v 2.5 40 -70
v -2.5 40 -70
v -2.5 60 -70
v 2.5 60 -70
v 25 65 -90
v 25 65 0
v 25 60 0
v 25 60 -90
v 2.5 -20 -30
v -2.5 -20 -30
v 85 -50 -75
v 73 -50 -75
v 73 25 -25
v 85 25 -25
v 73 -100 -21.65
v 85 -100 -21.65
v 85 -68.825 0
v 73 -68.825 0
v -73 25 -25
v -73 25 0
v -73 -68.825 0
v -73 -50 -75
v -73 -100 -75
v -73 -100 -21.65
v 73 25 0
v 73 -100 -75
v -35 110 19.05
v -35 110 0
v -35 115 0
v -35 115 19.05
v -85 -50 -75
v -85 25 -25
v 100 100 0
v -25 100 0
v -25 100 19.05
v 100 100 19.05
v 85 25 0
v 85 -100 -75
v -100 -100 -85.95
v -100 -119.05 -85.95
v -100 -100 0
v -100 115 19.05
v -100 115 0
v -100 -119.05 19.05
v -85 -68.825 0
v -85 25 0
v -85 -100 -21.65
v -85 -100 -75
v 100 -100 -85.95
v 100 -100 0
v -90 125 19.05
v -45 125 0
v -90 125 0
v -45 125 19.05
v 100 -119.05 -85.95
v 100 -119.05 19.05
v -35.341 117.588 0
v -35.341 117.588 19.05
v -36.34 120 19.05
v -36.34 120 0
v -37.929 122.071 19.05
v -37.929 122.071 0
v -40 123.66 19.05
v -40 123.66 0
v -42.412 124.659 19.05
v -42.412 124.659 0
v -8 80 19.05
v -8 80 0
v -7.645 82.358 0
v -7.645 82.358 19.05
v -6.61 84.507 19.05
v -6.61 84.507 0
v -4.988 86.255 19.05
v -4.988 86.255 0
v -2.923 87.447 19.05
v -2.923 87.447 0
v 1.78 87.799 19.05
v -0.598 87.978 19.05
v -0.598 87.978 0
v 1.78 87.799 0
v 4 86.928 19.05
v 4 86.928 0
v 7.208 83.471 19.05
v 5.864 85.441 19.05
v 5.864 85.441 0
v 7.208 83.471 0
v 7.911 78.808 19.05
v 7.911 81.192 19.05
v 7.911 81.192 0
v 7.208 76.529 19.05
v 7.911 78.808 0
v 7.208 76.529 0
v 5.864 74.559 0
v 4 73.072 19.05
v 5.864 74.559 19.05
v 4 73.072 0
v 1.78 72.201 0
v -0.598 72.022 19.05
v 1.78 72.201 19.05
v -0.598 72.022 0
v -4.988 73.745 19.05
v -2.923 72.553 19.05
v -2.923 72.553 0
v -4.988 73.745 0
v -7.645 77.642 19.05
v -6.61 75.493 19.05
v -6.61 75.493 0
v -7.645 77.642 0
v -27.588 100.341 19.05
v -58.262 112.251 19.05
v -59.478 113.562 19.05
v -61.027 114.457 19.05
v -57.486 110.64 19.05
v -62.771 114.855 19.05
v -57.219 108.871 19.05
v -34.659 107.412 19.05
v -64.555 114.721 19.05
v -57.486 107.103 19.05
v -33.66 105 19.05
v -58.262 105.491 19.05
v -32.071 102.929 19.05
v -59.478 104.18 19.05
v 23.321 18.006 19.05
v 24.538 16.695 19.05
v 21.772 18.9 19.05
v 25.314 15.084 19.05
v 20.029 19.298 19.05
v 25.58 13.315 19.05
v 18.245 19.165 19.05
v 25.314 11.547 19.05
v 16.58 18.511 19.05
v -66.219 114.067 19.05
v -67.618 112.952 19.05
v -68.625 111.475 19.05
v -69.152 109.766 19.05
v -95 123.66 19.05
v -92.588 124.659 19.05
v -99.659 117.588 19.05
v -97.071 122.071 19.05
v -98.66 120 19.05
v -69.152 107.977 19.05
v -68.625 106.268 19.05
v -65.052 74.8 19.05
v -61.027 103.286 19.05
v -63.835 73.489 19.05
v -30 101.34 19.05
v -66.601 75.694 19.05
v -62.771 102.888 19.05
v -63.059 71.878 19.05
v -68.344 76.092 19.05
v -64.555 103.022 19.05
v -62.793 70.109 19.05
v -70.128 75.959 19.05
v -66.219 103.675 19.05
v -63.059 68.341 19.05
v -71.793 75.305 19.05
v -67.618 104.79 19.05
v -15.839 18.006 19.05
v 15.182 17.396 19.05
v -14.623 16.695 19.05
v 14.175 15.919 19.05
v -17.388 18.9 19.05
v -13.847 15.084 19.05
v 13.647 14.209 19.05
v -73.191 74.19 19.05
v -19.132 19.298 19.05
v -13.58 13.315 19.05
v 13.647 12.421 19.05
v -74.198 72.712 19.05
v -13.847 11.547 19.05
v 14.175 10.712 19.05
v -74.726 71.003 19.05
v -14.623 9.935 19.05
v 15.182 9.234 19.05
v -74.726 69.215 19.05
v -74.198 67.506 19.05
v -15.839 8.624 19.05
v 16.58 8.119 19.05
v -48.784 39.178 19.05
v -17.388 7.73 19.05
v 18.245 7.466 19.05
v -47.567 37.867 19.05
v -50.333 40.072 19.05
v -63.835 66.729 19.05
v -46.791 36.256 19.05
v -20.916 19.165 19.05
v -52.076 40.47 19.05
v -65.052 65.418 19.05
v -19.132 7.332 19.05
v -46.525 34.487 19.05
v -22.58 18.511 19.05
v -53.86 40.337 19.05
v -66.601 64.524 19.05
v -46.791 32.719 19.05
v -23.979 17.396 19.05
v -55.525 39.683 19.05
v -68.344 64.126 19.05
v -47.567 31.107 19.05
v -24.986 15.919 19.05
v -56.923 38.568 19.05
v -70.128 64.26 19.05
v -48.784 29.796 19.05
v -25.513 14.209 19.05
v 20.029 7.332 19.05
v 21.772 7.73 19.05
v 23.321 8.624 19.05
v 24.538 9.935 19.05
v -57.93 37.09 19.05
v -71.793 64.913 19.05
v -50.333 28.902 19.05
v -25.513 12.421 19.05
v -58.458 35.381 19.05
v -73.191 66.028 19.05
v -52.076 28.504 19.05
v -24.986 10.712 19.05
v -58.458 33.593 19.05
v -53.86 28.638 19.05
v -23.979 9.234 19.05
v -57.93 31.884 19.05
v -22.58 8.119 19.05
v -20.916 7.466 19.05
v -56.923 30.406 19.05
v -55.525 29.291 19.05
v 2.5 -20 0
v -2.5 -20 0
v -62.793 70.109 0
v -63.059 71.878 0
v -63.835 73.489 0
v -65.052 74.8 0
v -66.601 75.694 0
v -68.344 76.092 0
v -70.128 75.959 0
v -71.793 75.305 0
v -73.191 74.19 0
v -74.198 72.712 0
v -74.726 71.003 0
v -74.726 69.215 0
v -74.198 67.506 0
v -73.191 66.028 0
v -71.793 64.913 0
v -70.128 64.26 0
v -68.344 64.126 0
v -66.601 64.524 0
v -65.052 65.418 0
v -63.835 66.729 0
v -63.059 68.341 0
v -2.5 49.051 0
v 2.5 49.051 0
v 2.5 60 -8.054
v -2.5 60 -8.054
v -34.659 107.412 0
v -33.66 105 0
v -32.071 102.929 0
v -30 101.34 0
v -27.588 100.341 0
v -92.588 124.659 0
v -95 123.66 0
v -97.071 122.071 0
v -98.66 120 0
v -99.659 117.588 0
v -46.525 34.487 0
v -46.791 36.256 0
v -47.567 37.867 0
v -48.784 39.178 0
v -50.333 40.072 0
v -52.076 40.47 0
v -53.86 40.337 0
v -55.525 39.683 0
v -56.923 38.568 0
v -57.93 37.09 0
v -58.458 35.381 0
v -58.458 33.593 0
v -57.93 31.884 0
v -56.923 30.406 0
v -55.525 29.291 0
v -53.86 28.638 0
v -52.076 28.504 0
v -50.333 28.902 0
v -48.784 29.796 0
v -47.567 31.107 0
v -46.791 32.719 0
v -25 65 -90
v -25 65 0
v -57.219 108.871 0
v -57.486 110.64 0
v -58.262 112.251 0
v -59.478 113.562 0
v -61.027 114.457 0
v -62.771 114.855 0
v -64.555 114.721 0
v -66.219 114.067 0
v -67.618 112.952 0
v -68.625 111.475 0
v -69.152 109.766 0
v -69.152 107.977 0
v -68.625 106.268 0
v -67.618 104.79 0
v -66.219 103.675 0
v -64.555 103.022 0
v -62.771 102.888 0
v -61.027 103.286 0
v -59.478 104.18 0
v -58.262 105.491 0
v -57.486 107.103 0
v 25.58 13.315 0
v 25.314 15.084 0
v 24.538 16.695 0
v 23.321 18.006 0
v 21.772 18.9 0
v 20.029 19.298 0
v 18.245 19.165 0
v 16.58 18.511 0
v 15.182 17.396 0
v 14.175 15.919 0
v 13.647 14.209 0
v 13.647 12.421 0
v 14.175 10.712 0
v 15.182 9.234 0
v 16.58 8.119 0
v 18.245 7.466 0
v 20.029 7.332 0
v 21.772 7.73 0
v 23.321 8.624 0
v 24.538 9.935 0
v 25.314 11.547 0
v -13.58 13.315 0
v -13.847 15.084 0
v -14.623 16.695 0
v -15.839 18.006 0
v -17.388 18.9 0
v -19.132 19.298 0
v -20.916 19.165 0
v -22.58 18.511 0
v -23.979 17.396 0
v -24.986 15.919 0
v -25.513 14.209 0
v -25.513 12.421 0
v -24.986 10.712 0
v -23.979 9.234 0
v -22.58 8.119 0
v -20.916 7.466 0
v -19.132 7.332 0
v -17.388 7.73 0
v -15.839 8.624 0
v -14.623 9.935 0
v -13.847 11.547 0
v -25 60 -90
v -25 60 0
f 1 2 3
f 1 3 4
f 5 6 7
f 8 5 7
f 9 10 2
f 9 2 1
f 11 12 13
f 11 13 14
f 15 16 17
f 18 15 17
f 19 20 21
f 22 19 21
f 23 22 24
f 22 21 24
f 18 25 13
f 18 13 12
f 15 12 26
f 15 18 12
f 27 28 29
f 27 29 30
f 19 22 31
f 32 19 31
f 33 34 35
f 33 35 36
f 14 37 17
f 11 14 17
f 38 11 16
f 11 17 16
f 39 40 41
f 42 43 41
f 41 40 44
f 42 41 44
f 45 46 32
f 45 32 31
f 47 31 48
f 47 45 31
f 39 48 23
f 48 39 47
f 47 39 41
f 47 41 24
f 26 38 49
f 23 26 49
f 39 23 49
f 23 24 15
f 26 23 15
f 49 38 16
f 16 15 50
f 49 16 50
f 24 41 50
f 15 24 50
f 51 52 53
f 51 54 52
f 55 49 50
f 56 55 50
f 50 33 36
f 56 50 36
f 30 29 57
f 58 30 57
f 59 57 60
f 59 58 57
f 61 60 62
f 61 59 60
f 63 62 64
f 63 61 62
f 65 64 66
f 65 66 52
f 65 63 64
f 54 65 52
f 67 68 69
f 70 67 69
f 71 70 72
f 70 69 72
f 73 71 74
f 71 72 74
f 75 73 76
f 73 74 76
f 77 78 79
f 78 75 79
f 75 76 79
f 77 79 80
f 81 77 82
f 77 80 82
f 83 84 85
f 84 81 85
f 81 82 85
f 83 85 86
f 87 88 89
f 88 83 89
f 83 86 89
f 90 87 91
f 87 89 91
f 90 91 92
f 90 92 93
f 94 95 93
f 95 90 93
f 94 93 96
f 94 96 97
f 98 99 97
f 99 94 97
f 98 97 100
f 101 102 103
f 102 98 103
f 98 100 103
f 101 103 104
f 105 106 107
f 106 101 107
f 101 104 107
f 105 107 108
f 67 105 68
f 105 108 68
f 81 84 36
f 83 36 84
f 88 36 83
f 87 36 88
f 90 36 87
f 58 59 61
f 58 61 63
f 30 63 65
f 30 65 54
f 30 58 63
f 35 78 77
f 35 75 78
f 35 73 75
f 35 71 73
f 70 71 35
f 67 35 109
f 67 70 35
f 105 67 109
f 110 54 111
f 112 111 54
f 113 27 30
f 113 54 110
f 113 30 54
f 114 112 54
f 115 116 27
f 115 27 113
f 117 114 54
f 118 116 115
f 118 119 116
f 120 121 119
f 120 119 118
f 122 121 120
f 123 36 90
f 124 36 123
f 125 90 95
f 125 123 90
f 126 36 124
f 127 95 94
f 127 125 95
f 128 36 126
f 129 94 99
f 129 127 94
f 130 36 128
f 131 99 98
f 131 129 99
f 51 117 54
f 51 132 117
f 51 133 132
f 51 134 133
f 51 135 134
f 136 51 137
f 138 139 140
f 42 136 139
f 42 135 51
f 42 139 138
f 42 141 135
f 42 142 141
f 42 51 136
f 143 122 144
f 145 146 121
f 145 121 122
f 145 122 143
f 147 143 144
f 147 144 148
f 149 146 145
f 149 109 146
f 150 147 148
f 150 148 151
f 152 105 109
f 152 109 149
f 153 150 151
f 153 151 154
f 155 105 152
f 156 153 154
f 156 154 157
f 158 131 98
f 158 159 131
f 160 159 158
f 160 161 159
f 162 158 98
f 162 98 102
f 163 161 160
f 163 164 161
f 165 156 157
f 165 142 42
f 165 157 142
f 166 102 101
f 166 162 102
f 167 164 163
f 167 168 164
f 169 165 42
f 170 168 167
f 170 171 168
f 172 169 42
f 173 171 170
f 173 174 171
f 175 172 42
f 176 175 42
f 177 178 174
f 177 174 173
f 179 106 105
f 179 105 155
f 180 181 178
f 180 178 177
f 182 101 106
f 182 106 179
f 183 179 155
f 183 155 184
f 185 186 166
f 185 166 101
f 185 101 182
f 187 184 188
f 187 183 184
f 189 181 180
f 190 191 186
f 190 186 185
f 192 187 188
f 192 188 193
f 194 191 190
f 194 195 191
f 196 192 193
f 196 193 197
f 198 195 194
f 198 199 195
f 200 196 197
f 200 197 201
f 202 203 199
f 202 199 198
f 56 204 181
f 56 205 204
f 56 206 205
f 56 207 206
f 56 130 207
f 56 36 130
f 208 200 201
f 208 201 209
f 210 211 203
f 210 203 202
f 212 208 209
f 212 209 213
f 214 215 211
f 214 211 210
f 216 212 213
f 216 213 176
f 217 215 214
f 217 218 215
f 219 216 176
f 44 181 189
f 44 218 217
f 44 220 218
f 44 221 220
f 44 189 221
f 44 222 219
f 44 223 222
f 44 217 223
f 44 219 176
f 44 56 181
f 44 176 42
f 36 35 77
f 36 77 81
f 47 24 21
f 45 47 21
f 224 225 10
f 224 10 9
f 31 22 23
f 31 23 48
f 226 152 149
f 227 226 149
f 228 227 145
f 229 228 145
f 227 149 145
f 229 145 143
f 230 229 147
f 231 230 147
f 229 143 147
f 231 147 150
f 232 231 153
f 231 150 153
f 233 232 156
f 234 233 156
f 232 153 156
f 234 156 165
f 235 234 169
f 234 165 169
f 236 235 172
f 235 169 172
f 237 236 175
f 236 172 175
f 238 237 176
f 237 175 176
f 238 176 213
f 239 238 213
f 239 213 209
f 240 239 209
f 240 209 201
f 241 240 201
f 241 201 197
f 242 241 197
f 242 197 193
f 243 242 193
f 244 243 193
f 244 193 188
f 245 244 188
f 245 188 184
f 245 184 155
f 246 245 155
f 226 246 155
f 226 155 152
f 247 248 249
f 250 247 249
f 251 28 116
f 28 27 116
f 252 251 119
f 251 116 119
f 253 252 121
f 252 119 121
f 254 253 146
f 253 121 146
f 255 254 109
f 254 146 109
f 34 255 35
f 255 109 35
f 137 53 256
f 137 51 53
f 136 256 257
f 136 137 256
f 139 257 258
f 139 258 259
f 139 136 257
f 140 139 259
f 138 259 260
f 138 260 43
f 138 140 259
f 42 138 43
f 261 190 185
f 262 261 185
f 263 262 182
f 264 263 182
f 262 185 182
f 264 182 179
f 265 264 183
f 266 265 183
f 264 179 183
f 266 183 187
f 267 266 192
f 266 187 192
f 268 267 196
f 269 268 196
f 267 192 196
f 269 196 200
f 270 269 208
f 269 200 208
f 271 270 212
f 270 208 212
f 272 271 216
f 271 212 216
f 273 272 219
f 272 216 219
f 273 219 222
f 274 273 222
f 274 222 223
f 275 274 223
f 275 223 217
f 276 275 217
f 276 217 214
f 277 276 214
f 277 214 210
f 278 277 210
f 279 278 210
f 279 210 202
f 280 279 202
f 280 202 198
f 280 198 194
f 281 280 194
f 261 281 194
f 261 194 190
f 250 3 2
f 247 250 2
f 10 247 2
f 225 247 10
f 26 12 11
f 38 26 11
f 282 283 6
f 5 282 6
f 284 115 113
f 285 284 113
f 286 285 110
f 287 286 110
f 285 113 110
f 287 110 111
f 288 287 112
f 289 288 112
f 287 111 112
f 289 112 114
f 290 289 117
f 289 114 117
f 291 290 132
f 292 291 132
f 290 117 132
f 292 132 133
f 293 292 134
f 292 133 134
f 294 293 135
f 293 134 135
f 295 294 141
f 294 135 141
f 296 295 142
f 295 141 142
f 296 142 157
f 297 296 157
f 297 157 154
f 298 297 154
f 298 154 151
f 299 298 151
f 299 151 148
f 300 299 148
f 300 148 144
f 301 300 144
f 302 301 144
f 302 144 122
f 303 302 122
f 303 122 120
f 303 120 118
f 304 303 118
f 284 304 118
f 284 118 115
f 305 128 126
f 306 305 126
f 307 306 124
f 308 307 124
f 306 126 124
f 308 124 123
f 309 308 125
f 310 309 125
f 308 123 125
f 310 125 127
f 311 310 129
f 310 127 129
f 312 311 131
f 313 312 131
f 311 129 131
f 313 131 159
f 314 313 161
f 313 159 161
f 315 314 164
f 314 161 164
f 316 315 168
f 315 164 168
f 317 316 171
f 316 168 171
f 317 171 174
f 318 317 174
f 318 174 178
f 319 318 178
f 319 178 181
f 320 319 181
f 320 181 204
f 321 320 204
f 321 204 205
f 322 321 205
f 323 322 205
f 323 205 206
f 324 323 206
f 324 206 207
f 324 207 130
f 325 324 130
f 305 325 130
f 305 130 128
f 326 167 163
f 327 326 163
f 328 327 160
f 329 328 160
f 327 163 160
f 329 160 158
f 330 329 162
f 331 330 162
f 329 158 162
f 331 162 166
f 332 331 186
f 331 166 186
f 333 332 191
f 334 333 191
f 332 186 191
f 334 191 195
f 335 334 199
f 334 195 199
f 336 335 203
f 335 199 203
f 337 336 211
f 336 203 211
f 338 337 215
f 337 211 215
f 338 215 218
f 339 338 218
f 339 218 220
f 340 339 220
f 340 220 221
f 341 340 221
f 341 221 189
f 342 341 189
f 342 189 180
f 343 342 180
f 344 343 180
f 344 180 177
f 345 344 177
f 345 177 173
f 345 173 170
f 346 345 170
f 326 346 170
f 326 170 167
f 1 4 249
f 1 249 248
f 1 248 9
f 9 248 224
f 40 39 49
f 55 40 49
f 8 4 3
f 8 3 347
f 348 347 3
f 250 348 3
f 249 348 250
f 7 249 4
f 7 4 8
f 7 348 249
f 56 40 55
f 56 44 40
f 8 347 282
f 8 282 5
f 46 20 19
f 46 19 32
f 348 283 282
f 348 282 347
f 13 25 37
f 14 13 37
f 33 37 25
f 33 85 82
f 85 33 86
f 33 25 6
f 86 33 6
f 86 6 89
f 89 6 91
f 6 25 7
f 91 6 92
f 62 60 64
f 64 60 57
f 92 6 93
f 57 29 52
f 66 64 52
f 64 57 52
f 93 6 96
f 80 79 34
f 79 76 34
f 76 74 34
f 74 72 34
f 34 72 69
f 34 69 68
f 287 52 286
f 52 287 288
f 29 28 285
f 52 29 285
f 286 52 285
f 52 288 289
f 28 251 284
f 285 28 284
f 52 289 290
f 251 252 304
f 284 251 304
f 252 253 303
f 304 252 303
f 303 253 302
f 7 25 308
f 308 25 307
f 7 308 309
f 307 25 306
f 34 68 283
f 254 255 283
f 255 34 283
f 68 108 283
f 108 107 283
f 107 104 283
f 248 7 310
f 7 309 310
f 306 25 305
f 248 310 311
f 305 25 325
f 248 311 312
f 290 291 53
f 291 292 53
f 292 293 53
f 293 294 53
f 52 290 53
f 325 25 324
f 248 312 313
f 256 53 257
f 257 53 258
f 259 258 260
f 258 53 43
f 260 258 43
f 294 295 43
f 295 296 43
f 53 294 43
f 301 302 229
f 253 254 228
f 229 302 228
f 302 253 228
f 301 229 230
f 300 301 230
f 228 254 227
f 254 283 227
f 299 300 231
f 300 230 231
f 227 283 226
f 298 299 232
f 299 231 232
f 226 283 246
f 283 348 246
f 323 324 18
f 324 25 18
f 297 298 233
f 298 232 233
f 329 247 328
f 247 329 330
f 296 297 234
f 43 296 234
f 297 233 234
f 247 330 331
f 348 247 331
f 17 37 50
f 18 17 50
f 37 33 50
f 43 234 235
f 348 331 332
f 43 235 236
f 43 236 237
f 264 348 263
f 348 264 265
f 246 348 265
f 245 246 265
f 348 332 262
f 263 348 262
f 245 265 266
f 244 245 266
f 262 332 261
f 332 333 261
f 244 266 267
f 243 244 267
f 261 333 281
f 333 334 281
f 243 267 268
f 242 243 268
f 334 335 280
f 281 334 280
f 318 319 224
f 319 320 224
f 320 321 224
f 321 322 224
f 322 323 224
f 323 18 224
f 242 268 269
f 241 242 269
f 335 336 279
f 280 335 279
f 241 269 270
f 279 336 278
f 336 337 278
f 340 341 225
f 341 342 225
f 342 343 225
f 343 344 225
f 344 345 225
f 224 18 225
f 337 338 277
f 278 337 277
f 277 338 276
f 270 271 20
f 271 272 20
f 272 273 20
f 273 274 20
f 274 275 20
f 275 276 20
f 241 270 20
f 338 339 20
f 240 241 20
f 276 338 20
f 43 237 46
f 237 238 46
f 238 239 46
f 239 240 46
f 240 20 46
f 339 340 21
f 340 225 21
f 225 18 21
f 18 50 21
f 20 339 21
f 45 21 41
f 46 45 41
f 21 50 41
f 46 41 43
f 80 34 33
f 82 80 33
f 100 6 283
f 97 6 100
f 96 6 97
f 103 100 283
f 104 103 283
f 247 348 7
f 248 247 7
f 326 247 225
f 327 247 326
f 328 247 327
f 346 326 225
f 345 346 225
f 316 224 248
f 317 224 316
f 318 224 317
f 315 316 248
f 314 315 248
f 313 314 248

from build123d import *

# Parameters (mm, degrees)
F0_W      = 200
F0_H      = 200
F1_DEPTH  = 19.05
F3_D      = 16
F4_W      = 12
F4_H      = 125
F5_DEPTH  = 75
F6_SIZE2  = 75
F6_SIZE   = 50
F9_DEPTH  = 19.05
F11_DEPTH = 500
F12_W     = 50
F12_H     = 5
F13_DEPTH = 90
F14_W     = 5
F14_H     = 80
F15_DEPTH = 70
F16_SIZE2 = 40
F16_SIZE  = 60
F18_DEPTH = 25
F19_W     = 65
F19_H     = 19.05
F20_DEPTH = 25
F21_R     = 10
F22_R     = 6
F23_DEPTH = 25


with BuildPart() as f1:
    # F0 (on Top) → F1 (new body)
    with BuildSketch(Plane.XY):
        Rectangle(F0_W, F0_H)
    extrude(amount=F1_DEPTH)

    # F3 (through all)
    with Locations(Plane.XY.offset(19.05)):
        with Locations((0, 80)):
            Hole(F3_D / 2)

    # F4 (on face) → F5 (join)
    with BuildSketch(Plane(origin=(0, 0, 0), x_dir=(1, 0, 0), z_dir=(0, 0, -1))):
        with Locations((79, 37.5)):
            Rectangle(F4_W, F4_H)
    extrude(amount=F5_DEPTH)

    # F6
    f6_edges = [f1.edges().sort_by_distance(p)[0] for p in [
        (79, 25, -75),
    ]]
    f6_side = f1.faces().sort_by_distance((79, 25, -37.5))[0]
    chamfer(f6_edges, length=F6_SIZE, length2=F6_SIZE2, reference=f6_side)

    # F7: F1 across plane


with BuildPart() as f1_1:
    add(f1.part)
    add(f1.part.mirror(Plane.YZ))

    # F8 (on face) → F9 (join)
    with BuildSketch(Plane.XZ.offset(100)):
        Polygon((100, -85.95), (100, 0), (85, 0), (85, -75), (73, -75), (73, 0), (-73, 0), (-73, -75), (-85, -75), (-85, 0), (-100, 0), (-100, -85.95), align=None)
        Polygon((100, 0), (100, 19.05), (-100, 19.05), (-100, 0), (-85, 0), (-85, -75), (-73, -75), (-73, 0), (73, 0), (73, -75), (85, -75), (85, 0), align=None)
    extrude(amount=F9_DEPTH)

    # F10 (on face) → F11 (cut)
    with BuildSketch(Plane.YZ.offset(85)):
        Polygon((-100, 0), (-100, -21.6502193362), (-68.8245669007, 0), align=None)
    extrude(amount=-F11_DEPTH, mode=Mode.SUBTRACT)

    # F12 (on face) → F13 (join)
    with BuildSketch(Plane(origin=(0, 0, 0), x_dir=(1, 0, 0), z_dir=(0, 0, -1))):
        with Locations((0, -62.5)):
            Rectangle(F12_W, F12_H)
    extrude(amount=F13_DEPTH)

    # F14 (on face) → F15 (join)
    with BuildSketch(Plane(origin=(0, 0, 0), x_dir=(1, 0, 0), z_dir=(0, 0, -1))):
        with Locations((0, -20)):
            Rectangle(F14_W, F14_H)
    extrude(amount=F15_DEPTH)

    # F16
    f16_edges = [f1_1.edges().sort_by_distance(p)[0] for p in [
        (0, -20, -70),
    ]]
    f16_side = f1_1.faces().sort_by_distance((0, 20, -70))[0]
    chamfer(f16_edges, length=F16_SIZE, length2=F16_SIZE2, reference=f16_side)

    # F17 (on face) → F18 (cut)
    with BuildSketch(Plane.YZ.offset(2.5)):
        Polygon((60, 0), (49.0511549105, 0), (60, -8.0538968956), align=None)
    extrude(amount=-F18_DEPTH, mode=Mode.SUBTRACT)

    # F19 (on face) → F20 (join)
    with BuildSketch(Plane(origin=(0, 100, 0), x_dir=(-1, 0, 0), z_dir=(0, 1, 0))):
        with Locations((67.5, 9.525)):
            Rectangle(F19_W, F19_H)
    extrude(amount=F20_DEPTH)

    # F21
    f21_edges = [f1_1.edges().sort_by_distance(p)[0] for p in [
        (-100, 125, 9.525),
        (-35, 125, 9.525),
        (-35, 100, 9.525),
    ]]
    fillet(f21_edges, radius=F21_R)

    # F22 (on face) → F23 (cut)
    with BuildSketch(Plane.XY.offset(19.05)):
        with Locations((-63.2194236771, 108.8713434036)):
            Circle(F22_R)
        with Locations((-68.7925902107, 70.10911874)):
            Circle(F22_R)
        with Locations((-52.5245954176, 34.4871789908)):
            Circle(F22_R)
        with Locations((-19.5804127005, 13.3152383338)):
            Circle(F22_R)
        with Locations((19.5804127005, 13.3152383338)):
            Circle(F22_R)
    extrude(amount=-F23_DEPTH, mode=Mode.SUBTRACT)


solid = f1_1.part
